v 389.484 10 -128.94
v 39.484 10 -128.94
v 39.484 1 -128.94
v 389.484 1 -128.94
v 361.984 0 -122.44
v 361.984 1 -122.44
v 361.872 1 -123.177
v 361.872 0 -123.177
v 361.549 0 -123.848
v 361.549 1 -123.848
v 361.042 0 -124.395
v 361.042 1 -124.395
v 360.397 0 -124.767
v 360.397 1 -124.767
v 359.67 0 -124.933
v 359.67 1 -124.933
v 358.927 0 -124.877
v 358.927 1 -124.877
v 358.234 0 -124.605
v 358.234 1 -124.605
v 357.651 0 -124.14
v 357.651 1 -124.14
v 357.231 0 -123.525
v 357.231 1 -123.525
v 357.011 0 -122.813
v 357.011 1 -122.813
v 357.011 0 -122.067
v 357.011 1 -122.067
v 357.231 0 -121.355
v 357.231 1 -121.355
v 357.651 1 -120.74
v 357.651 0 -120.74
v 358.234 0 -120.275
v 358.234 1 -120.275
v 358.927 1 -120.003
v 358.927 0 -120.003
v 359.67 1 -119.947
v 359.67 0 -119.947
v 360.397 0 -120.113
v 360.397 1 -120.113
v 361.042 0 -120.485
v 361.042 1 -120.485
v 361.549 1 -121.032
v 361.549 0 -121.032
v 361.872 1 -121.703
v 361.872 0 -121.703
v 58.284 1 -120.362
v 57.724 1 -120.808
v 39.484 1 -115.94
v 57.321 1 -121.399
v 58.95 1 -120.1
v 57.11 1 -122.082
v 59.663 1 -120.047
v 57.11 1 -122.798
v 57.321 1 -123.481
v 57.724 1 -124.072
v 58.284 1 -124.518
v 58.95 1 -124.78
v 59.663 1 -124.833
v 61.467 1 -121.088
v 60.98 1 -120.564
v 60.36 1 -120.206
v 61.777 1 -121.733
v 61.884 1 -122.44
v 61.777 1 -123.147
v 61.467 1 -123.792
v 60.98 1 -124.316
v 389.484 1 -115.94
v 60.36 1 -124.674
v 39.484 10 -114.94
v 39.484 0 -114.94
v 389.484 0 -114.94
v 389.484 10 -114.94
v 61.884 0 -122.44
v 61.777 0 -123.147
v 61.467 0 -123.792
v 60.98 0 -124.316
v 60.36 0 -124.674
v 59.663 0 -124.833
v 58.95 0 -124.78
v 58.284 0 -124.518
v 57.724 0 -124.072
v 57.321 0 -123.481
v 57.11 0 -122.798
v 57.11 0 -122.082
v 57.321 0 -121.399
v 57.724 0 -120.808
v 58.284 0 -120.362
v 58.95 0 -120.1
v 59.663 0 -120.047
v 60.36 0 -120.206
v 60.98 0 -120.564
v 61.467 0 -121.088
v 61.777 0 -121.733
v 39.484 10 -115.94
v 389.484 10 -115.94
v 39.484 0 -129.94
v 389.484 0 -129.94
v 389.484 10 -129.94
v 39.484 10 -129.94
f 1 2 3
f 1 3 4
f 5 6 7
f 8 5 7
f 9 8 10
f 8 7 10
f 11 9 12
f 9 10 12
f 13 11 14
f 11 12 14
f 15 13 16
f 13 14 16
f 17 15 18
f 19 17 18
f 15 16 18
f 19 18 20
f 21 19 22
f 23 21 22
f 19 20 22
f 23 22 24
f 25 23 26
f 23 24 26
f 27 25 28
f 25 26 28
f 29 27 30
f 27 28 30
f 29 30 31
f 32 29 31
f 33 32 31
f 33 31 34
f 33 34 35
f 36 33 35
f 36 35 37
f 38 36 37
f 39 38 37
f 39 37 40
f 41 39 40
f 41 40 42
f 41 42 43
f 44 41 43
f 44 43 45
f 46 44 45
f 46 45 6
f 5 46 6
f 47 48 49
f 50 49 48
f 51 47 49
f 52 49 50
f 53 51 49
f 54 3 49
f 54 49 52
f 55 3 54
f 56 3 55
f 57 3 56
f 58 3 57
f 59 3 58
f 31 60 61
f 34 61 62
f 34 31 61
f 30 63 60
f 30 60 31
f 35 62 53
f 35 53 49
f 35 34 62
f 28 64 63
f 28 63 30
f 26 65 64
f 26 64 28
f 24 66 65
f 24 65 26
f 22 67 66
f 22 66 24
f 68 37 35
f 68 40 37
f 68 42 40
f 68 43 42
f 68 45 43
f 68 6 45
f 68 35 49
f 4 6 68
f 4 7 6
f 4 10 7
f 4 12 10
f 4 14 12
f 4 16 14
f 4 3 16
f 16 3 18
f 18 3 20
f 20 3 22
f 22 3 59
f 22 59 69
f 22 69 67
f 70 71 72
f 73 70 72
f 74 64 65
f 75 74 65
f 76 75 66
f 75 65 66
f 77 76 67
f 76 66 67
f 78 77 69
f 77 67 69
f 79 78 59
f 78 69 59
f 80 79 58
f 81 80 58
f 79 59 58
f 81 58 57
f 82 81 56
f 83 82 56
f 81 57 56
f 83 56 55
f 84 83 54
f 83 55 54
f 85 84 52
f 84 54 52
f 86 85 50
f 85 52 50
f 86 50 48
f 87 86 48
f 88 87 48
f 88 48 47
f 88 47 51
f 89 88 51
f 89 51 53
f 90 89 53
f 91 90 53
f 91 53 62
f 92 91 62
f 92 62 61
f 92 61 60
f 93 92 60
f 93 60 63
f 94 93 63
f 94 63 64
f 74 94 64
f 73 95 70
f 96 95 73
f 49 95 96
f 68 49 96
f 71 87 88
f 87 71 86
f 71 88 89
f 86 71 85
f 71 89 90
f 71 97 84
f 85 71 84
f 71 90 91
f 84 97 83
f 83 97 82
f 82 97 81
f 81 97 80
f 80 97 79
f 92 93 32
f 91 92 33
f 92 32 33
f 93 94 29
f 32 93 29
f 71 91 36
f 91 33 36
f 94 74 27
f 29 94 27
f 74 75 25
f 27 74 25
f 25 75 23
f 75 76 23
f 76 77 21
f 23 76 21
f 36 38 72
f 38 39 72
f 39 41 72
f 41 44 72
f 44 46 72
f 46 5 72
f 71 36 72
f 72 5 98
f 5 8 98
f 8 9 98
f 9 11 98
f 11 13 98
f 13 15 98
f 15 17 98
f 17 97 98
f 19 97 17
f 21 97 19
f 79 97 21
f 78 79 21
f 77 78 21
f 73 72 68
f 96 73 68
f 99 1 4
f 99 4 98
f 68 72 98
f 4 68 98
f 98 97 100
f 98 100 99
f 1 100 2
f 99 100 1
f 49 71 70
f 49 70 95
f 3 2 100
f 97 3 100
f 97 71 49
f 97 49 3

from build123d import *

# Parameters (mm, degrees)
SKETCH2_W           = 350
SKETCH2_H           = 15
BOSS_EXTRUDE1_DEPTH = 10
SKETCH3_W           = 350
SKETCH3_H           = 13
CUT_EXTRUDE1_DEPTH  = 9
SKETCH4_R           = 2.4
SKETCH4_R_2         = 2.5
CUT_EXTRUDE3_DEPTH  = 10


with BuildPart() as part:
    # Sketch2 → Boss-Extrude1 (new body)
    with BuildSketch(Plane(origin=(0, 0, 0), x_dir=(1, 0, 0), z_dir=(0, 1, 0))):
        with Locations((214.483557787, 122.439976597)):
            Rectangle(SKETCH2_W, SKETCH2_H)
    extrude(amount=BOSS_EXTRUDE1_DEPTH)

    # Sketch3 → Cut-Extrude1 (cut)
    with BuildSketch(Plane(origin=(0, 10, 0), x_dir=(1, 0, 0), z_dir=(0, 1, 0))):
        with Locations((214.483557787, 122.439976597)):
            Rectangle(SKETCH3_W, SKETCH3_H)
    extrude(amount=-CUT_EXTRUDE1_DEPTH, mode=Mode.SUBTRACT)

    # Sketch4 → Cut-Extrude3 (cut)
    with BuildSketch(Plane(origin=(0, 1, 0), x_dir=(1, 0, 0), z_dir=(0, 1, 0))):
        with Locations((59.483557787, 122.439976597)):
            Circle(SKETCH4_R)
        with Locations((359.483557787, 122.439976597)):
            Circle(SKETCH4_R_2)
    extrude(amount=-CUT_EXTRUDE3_DEPTH, mode=Mode.SUBTRACT)


solid = part.part
